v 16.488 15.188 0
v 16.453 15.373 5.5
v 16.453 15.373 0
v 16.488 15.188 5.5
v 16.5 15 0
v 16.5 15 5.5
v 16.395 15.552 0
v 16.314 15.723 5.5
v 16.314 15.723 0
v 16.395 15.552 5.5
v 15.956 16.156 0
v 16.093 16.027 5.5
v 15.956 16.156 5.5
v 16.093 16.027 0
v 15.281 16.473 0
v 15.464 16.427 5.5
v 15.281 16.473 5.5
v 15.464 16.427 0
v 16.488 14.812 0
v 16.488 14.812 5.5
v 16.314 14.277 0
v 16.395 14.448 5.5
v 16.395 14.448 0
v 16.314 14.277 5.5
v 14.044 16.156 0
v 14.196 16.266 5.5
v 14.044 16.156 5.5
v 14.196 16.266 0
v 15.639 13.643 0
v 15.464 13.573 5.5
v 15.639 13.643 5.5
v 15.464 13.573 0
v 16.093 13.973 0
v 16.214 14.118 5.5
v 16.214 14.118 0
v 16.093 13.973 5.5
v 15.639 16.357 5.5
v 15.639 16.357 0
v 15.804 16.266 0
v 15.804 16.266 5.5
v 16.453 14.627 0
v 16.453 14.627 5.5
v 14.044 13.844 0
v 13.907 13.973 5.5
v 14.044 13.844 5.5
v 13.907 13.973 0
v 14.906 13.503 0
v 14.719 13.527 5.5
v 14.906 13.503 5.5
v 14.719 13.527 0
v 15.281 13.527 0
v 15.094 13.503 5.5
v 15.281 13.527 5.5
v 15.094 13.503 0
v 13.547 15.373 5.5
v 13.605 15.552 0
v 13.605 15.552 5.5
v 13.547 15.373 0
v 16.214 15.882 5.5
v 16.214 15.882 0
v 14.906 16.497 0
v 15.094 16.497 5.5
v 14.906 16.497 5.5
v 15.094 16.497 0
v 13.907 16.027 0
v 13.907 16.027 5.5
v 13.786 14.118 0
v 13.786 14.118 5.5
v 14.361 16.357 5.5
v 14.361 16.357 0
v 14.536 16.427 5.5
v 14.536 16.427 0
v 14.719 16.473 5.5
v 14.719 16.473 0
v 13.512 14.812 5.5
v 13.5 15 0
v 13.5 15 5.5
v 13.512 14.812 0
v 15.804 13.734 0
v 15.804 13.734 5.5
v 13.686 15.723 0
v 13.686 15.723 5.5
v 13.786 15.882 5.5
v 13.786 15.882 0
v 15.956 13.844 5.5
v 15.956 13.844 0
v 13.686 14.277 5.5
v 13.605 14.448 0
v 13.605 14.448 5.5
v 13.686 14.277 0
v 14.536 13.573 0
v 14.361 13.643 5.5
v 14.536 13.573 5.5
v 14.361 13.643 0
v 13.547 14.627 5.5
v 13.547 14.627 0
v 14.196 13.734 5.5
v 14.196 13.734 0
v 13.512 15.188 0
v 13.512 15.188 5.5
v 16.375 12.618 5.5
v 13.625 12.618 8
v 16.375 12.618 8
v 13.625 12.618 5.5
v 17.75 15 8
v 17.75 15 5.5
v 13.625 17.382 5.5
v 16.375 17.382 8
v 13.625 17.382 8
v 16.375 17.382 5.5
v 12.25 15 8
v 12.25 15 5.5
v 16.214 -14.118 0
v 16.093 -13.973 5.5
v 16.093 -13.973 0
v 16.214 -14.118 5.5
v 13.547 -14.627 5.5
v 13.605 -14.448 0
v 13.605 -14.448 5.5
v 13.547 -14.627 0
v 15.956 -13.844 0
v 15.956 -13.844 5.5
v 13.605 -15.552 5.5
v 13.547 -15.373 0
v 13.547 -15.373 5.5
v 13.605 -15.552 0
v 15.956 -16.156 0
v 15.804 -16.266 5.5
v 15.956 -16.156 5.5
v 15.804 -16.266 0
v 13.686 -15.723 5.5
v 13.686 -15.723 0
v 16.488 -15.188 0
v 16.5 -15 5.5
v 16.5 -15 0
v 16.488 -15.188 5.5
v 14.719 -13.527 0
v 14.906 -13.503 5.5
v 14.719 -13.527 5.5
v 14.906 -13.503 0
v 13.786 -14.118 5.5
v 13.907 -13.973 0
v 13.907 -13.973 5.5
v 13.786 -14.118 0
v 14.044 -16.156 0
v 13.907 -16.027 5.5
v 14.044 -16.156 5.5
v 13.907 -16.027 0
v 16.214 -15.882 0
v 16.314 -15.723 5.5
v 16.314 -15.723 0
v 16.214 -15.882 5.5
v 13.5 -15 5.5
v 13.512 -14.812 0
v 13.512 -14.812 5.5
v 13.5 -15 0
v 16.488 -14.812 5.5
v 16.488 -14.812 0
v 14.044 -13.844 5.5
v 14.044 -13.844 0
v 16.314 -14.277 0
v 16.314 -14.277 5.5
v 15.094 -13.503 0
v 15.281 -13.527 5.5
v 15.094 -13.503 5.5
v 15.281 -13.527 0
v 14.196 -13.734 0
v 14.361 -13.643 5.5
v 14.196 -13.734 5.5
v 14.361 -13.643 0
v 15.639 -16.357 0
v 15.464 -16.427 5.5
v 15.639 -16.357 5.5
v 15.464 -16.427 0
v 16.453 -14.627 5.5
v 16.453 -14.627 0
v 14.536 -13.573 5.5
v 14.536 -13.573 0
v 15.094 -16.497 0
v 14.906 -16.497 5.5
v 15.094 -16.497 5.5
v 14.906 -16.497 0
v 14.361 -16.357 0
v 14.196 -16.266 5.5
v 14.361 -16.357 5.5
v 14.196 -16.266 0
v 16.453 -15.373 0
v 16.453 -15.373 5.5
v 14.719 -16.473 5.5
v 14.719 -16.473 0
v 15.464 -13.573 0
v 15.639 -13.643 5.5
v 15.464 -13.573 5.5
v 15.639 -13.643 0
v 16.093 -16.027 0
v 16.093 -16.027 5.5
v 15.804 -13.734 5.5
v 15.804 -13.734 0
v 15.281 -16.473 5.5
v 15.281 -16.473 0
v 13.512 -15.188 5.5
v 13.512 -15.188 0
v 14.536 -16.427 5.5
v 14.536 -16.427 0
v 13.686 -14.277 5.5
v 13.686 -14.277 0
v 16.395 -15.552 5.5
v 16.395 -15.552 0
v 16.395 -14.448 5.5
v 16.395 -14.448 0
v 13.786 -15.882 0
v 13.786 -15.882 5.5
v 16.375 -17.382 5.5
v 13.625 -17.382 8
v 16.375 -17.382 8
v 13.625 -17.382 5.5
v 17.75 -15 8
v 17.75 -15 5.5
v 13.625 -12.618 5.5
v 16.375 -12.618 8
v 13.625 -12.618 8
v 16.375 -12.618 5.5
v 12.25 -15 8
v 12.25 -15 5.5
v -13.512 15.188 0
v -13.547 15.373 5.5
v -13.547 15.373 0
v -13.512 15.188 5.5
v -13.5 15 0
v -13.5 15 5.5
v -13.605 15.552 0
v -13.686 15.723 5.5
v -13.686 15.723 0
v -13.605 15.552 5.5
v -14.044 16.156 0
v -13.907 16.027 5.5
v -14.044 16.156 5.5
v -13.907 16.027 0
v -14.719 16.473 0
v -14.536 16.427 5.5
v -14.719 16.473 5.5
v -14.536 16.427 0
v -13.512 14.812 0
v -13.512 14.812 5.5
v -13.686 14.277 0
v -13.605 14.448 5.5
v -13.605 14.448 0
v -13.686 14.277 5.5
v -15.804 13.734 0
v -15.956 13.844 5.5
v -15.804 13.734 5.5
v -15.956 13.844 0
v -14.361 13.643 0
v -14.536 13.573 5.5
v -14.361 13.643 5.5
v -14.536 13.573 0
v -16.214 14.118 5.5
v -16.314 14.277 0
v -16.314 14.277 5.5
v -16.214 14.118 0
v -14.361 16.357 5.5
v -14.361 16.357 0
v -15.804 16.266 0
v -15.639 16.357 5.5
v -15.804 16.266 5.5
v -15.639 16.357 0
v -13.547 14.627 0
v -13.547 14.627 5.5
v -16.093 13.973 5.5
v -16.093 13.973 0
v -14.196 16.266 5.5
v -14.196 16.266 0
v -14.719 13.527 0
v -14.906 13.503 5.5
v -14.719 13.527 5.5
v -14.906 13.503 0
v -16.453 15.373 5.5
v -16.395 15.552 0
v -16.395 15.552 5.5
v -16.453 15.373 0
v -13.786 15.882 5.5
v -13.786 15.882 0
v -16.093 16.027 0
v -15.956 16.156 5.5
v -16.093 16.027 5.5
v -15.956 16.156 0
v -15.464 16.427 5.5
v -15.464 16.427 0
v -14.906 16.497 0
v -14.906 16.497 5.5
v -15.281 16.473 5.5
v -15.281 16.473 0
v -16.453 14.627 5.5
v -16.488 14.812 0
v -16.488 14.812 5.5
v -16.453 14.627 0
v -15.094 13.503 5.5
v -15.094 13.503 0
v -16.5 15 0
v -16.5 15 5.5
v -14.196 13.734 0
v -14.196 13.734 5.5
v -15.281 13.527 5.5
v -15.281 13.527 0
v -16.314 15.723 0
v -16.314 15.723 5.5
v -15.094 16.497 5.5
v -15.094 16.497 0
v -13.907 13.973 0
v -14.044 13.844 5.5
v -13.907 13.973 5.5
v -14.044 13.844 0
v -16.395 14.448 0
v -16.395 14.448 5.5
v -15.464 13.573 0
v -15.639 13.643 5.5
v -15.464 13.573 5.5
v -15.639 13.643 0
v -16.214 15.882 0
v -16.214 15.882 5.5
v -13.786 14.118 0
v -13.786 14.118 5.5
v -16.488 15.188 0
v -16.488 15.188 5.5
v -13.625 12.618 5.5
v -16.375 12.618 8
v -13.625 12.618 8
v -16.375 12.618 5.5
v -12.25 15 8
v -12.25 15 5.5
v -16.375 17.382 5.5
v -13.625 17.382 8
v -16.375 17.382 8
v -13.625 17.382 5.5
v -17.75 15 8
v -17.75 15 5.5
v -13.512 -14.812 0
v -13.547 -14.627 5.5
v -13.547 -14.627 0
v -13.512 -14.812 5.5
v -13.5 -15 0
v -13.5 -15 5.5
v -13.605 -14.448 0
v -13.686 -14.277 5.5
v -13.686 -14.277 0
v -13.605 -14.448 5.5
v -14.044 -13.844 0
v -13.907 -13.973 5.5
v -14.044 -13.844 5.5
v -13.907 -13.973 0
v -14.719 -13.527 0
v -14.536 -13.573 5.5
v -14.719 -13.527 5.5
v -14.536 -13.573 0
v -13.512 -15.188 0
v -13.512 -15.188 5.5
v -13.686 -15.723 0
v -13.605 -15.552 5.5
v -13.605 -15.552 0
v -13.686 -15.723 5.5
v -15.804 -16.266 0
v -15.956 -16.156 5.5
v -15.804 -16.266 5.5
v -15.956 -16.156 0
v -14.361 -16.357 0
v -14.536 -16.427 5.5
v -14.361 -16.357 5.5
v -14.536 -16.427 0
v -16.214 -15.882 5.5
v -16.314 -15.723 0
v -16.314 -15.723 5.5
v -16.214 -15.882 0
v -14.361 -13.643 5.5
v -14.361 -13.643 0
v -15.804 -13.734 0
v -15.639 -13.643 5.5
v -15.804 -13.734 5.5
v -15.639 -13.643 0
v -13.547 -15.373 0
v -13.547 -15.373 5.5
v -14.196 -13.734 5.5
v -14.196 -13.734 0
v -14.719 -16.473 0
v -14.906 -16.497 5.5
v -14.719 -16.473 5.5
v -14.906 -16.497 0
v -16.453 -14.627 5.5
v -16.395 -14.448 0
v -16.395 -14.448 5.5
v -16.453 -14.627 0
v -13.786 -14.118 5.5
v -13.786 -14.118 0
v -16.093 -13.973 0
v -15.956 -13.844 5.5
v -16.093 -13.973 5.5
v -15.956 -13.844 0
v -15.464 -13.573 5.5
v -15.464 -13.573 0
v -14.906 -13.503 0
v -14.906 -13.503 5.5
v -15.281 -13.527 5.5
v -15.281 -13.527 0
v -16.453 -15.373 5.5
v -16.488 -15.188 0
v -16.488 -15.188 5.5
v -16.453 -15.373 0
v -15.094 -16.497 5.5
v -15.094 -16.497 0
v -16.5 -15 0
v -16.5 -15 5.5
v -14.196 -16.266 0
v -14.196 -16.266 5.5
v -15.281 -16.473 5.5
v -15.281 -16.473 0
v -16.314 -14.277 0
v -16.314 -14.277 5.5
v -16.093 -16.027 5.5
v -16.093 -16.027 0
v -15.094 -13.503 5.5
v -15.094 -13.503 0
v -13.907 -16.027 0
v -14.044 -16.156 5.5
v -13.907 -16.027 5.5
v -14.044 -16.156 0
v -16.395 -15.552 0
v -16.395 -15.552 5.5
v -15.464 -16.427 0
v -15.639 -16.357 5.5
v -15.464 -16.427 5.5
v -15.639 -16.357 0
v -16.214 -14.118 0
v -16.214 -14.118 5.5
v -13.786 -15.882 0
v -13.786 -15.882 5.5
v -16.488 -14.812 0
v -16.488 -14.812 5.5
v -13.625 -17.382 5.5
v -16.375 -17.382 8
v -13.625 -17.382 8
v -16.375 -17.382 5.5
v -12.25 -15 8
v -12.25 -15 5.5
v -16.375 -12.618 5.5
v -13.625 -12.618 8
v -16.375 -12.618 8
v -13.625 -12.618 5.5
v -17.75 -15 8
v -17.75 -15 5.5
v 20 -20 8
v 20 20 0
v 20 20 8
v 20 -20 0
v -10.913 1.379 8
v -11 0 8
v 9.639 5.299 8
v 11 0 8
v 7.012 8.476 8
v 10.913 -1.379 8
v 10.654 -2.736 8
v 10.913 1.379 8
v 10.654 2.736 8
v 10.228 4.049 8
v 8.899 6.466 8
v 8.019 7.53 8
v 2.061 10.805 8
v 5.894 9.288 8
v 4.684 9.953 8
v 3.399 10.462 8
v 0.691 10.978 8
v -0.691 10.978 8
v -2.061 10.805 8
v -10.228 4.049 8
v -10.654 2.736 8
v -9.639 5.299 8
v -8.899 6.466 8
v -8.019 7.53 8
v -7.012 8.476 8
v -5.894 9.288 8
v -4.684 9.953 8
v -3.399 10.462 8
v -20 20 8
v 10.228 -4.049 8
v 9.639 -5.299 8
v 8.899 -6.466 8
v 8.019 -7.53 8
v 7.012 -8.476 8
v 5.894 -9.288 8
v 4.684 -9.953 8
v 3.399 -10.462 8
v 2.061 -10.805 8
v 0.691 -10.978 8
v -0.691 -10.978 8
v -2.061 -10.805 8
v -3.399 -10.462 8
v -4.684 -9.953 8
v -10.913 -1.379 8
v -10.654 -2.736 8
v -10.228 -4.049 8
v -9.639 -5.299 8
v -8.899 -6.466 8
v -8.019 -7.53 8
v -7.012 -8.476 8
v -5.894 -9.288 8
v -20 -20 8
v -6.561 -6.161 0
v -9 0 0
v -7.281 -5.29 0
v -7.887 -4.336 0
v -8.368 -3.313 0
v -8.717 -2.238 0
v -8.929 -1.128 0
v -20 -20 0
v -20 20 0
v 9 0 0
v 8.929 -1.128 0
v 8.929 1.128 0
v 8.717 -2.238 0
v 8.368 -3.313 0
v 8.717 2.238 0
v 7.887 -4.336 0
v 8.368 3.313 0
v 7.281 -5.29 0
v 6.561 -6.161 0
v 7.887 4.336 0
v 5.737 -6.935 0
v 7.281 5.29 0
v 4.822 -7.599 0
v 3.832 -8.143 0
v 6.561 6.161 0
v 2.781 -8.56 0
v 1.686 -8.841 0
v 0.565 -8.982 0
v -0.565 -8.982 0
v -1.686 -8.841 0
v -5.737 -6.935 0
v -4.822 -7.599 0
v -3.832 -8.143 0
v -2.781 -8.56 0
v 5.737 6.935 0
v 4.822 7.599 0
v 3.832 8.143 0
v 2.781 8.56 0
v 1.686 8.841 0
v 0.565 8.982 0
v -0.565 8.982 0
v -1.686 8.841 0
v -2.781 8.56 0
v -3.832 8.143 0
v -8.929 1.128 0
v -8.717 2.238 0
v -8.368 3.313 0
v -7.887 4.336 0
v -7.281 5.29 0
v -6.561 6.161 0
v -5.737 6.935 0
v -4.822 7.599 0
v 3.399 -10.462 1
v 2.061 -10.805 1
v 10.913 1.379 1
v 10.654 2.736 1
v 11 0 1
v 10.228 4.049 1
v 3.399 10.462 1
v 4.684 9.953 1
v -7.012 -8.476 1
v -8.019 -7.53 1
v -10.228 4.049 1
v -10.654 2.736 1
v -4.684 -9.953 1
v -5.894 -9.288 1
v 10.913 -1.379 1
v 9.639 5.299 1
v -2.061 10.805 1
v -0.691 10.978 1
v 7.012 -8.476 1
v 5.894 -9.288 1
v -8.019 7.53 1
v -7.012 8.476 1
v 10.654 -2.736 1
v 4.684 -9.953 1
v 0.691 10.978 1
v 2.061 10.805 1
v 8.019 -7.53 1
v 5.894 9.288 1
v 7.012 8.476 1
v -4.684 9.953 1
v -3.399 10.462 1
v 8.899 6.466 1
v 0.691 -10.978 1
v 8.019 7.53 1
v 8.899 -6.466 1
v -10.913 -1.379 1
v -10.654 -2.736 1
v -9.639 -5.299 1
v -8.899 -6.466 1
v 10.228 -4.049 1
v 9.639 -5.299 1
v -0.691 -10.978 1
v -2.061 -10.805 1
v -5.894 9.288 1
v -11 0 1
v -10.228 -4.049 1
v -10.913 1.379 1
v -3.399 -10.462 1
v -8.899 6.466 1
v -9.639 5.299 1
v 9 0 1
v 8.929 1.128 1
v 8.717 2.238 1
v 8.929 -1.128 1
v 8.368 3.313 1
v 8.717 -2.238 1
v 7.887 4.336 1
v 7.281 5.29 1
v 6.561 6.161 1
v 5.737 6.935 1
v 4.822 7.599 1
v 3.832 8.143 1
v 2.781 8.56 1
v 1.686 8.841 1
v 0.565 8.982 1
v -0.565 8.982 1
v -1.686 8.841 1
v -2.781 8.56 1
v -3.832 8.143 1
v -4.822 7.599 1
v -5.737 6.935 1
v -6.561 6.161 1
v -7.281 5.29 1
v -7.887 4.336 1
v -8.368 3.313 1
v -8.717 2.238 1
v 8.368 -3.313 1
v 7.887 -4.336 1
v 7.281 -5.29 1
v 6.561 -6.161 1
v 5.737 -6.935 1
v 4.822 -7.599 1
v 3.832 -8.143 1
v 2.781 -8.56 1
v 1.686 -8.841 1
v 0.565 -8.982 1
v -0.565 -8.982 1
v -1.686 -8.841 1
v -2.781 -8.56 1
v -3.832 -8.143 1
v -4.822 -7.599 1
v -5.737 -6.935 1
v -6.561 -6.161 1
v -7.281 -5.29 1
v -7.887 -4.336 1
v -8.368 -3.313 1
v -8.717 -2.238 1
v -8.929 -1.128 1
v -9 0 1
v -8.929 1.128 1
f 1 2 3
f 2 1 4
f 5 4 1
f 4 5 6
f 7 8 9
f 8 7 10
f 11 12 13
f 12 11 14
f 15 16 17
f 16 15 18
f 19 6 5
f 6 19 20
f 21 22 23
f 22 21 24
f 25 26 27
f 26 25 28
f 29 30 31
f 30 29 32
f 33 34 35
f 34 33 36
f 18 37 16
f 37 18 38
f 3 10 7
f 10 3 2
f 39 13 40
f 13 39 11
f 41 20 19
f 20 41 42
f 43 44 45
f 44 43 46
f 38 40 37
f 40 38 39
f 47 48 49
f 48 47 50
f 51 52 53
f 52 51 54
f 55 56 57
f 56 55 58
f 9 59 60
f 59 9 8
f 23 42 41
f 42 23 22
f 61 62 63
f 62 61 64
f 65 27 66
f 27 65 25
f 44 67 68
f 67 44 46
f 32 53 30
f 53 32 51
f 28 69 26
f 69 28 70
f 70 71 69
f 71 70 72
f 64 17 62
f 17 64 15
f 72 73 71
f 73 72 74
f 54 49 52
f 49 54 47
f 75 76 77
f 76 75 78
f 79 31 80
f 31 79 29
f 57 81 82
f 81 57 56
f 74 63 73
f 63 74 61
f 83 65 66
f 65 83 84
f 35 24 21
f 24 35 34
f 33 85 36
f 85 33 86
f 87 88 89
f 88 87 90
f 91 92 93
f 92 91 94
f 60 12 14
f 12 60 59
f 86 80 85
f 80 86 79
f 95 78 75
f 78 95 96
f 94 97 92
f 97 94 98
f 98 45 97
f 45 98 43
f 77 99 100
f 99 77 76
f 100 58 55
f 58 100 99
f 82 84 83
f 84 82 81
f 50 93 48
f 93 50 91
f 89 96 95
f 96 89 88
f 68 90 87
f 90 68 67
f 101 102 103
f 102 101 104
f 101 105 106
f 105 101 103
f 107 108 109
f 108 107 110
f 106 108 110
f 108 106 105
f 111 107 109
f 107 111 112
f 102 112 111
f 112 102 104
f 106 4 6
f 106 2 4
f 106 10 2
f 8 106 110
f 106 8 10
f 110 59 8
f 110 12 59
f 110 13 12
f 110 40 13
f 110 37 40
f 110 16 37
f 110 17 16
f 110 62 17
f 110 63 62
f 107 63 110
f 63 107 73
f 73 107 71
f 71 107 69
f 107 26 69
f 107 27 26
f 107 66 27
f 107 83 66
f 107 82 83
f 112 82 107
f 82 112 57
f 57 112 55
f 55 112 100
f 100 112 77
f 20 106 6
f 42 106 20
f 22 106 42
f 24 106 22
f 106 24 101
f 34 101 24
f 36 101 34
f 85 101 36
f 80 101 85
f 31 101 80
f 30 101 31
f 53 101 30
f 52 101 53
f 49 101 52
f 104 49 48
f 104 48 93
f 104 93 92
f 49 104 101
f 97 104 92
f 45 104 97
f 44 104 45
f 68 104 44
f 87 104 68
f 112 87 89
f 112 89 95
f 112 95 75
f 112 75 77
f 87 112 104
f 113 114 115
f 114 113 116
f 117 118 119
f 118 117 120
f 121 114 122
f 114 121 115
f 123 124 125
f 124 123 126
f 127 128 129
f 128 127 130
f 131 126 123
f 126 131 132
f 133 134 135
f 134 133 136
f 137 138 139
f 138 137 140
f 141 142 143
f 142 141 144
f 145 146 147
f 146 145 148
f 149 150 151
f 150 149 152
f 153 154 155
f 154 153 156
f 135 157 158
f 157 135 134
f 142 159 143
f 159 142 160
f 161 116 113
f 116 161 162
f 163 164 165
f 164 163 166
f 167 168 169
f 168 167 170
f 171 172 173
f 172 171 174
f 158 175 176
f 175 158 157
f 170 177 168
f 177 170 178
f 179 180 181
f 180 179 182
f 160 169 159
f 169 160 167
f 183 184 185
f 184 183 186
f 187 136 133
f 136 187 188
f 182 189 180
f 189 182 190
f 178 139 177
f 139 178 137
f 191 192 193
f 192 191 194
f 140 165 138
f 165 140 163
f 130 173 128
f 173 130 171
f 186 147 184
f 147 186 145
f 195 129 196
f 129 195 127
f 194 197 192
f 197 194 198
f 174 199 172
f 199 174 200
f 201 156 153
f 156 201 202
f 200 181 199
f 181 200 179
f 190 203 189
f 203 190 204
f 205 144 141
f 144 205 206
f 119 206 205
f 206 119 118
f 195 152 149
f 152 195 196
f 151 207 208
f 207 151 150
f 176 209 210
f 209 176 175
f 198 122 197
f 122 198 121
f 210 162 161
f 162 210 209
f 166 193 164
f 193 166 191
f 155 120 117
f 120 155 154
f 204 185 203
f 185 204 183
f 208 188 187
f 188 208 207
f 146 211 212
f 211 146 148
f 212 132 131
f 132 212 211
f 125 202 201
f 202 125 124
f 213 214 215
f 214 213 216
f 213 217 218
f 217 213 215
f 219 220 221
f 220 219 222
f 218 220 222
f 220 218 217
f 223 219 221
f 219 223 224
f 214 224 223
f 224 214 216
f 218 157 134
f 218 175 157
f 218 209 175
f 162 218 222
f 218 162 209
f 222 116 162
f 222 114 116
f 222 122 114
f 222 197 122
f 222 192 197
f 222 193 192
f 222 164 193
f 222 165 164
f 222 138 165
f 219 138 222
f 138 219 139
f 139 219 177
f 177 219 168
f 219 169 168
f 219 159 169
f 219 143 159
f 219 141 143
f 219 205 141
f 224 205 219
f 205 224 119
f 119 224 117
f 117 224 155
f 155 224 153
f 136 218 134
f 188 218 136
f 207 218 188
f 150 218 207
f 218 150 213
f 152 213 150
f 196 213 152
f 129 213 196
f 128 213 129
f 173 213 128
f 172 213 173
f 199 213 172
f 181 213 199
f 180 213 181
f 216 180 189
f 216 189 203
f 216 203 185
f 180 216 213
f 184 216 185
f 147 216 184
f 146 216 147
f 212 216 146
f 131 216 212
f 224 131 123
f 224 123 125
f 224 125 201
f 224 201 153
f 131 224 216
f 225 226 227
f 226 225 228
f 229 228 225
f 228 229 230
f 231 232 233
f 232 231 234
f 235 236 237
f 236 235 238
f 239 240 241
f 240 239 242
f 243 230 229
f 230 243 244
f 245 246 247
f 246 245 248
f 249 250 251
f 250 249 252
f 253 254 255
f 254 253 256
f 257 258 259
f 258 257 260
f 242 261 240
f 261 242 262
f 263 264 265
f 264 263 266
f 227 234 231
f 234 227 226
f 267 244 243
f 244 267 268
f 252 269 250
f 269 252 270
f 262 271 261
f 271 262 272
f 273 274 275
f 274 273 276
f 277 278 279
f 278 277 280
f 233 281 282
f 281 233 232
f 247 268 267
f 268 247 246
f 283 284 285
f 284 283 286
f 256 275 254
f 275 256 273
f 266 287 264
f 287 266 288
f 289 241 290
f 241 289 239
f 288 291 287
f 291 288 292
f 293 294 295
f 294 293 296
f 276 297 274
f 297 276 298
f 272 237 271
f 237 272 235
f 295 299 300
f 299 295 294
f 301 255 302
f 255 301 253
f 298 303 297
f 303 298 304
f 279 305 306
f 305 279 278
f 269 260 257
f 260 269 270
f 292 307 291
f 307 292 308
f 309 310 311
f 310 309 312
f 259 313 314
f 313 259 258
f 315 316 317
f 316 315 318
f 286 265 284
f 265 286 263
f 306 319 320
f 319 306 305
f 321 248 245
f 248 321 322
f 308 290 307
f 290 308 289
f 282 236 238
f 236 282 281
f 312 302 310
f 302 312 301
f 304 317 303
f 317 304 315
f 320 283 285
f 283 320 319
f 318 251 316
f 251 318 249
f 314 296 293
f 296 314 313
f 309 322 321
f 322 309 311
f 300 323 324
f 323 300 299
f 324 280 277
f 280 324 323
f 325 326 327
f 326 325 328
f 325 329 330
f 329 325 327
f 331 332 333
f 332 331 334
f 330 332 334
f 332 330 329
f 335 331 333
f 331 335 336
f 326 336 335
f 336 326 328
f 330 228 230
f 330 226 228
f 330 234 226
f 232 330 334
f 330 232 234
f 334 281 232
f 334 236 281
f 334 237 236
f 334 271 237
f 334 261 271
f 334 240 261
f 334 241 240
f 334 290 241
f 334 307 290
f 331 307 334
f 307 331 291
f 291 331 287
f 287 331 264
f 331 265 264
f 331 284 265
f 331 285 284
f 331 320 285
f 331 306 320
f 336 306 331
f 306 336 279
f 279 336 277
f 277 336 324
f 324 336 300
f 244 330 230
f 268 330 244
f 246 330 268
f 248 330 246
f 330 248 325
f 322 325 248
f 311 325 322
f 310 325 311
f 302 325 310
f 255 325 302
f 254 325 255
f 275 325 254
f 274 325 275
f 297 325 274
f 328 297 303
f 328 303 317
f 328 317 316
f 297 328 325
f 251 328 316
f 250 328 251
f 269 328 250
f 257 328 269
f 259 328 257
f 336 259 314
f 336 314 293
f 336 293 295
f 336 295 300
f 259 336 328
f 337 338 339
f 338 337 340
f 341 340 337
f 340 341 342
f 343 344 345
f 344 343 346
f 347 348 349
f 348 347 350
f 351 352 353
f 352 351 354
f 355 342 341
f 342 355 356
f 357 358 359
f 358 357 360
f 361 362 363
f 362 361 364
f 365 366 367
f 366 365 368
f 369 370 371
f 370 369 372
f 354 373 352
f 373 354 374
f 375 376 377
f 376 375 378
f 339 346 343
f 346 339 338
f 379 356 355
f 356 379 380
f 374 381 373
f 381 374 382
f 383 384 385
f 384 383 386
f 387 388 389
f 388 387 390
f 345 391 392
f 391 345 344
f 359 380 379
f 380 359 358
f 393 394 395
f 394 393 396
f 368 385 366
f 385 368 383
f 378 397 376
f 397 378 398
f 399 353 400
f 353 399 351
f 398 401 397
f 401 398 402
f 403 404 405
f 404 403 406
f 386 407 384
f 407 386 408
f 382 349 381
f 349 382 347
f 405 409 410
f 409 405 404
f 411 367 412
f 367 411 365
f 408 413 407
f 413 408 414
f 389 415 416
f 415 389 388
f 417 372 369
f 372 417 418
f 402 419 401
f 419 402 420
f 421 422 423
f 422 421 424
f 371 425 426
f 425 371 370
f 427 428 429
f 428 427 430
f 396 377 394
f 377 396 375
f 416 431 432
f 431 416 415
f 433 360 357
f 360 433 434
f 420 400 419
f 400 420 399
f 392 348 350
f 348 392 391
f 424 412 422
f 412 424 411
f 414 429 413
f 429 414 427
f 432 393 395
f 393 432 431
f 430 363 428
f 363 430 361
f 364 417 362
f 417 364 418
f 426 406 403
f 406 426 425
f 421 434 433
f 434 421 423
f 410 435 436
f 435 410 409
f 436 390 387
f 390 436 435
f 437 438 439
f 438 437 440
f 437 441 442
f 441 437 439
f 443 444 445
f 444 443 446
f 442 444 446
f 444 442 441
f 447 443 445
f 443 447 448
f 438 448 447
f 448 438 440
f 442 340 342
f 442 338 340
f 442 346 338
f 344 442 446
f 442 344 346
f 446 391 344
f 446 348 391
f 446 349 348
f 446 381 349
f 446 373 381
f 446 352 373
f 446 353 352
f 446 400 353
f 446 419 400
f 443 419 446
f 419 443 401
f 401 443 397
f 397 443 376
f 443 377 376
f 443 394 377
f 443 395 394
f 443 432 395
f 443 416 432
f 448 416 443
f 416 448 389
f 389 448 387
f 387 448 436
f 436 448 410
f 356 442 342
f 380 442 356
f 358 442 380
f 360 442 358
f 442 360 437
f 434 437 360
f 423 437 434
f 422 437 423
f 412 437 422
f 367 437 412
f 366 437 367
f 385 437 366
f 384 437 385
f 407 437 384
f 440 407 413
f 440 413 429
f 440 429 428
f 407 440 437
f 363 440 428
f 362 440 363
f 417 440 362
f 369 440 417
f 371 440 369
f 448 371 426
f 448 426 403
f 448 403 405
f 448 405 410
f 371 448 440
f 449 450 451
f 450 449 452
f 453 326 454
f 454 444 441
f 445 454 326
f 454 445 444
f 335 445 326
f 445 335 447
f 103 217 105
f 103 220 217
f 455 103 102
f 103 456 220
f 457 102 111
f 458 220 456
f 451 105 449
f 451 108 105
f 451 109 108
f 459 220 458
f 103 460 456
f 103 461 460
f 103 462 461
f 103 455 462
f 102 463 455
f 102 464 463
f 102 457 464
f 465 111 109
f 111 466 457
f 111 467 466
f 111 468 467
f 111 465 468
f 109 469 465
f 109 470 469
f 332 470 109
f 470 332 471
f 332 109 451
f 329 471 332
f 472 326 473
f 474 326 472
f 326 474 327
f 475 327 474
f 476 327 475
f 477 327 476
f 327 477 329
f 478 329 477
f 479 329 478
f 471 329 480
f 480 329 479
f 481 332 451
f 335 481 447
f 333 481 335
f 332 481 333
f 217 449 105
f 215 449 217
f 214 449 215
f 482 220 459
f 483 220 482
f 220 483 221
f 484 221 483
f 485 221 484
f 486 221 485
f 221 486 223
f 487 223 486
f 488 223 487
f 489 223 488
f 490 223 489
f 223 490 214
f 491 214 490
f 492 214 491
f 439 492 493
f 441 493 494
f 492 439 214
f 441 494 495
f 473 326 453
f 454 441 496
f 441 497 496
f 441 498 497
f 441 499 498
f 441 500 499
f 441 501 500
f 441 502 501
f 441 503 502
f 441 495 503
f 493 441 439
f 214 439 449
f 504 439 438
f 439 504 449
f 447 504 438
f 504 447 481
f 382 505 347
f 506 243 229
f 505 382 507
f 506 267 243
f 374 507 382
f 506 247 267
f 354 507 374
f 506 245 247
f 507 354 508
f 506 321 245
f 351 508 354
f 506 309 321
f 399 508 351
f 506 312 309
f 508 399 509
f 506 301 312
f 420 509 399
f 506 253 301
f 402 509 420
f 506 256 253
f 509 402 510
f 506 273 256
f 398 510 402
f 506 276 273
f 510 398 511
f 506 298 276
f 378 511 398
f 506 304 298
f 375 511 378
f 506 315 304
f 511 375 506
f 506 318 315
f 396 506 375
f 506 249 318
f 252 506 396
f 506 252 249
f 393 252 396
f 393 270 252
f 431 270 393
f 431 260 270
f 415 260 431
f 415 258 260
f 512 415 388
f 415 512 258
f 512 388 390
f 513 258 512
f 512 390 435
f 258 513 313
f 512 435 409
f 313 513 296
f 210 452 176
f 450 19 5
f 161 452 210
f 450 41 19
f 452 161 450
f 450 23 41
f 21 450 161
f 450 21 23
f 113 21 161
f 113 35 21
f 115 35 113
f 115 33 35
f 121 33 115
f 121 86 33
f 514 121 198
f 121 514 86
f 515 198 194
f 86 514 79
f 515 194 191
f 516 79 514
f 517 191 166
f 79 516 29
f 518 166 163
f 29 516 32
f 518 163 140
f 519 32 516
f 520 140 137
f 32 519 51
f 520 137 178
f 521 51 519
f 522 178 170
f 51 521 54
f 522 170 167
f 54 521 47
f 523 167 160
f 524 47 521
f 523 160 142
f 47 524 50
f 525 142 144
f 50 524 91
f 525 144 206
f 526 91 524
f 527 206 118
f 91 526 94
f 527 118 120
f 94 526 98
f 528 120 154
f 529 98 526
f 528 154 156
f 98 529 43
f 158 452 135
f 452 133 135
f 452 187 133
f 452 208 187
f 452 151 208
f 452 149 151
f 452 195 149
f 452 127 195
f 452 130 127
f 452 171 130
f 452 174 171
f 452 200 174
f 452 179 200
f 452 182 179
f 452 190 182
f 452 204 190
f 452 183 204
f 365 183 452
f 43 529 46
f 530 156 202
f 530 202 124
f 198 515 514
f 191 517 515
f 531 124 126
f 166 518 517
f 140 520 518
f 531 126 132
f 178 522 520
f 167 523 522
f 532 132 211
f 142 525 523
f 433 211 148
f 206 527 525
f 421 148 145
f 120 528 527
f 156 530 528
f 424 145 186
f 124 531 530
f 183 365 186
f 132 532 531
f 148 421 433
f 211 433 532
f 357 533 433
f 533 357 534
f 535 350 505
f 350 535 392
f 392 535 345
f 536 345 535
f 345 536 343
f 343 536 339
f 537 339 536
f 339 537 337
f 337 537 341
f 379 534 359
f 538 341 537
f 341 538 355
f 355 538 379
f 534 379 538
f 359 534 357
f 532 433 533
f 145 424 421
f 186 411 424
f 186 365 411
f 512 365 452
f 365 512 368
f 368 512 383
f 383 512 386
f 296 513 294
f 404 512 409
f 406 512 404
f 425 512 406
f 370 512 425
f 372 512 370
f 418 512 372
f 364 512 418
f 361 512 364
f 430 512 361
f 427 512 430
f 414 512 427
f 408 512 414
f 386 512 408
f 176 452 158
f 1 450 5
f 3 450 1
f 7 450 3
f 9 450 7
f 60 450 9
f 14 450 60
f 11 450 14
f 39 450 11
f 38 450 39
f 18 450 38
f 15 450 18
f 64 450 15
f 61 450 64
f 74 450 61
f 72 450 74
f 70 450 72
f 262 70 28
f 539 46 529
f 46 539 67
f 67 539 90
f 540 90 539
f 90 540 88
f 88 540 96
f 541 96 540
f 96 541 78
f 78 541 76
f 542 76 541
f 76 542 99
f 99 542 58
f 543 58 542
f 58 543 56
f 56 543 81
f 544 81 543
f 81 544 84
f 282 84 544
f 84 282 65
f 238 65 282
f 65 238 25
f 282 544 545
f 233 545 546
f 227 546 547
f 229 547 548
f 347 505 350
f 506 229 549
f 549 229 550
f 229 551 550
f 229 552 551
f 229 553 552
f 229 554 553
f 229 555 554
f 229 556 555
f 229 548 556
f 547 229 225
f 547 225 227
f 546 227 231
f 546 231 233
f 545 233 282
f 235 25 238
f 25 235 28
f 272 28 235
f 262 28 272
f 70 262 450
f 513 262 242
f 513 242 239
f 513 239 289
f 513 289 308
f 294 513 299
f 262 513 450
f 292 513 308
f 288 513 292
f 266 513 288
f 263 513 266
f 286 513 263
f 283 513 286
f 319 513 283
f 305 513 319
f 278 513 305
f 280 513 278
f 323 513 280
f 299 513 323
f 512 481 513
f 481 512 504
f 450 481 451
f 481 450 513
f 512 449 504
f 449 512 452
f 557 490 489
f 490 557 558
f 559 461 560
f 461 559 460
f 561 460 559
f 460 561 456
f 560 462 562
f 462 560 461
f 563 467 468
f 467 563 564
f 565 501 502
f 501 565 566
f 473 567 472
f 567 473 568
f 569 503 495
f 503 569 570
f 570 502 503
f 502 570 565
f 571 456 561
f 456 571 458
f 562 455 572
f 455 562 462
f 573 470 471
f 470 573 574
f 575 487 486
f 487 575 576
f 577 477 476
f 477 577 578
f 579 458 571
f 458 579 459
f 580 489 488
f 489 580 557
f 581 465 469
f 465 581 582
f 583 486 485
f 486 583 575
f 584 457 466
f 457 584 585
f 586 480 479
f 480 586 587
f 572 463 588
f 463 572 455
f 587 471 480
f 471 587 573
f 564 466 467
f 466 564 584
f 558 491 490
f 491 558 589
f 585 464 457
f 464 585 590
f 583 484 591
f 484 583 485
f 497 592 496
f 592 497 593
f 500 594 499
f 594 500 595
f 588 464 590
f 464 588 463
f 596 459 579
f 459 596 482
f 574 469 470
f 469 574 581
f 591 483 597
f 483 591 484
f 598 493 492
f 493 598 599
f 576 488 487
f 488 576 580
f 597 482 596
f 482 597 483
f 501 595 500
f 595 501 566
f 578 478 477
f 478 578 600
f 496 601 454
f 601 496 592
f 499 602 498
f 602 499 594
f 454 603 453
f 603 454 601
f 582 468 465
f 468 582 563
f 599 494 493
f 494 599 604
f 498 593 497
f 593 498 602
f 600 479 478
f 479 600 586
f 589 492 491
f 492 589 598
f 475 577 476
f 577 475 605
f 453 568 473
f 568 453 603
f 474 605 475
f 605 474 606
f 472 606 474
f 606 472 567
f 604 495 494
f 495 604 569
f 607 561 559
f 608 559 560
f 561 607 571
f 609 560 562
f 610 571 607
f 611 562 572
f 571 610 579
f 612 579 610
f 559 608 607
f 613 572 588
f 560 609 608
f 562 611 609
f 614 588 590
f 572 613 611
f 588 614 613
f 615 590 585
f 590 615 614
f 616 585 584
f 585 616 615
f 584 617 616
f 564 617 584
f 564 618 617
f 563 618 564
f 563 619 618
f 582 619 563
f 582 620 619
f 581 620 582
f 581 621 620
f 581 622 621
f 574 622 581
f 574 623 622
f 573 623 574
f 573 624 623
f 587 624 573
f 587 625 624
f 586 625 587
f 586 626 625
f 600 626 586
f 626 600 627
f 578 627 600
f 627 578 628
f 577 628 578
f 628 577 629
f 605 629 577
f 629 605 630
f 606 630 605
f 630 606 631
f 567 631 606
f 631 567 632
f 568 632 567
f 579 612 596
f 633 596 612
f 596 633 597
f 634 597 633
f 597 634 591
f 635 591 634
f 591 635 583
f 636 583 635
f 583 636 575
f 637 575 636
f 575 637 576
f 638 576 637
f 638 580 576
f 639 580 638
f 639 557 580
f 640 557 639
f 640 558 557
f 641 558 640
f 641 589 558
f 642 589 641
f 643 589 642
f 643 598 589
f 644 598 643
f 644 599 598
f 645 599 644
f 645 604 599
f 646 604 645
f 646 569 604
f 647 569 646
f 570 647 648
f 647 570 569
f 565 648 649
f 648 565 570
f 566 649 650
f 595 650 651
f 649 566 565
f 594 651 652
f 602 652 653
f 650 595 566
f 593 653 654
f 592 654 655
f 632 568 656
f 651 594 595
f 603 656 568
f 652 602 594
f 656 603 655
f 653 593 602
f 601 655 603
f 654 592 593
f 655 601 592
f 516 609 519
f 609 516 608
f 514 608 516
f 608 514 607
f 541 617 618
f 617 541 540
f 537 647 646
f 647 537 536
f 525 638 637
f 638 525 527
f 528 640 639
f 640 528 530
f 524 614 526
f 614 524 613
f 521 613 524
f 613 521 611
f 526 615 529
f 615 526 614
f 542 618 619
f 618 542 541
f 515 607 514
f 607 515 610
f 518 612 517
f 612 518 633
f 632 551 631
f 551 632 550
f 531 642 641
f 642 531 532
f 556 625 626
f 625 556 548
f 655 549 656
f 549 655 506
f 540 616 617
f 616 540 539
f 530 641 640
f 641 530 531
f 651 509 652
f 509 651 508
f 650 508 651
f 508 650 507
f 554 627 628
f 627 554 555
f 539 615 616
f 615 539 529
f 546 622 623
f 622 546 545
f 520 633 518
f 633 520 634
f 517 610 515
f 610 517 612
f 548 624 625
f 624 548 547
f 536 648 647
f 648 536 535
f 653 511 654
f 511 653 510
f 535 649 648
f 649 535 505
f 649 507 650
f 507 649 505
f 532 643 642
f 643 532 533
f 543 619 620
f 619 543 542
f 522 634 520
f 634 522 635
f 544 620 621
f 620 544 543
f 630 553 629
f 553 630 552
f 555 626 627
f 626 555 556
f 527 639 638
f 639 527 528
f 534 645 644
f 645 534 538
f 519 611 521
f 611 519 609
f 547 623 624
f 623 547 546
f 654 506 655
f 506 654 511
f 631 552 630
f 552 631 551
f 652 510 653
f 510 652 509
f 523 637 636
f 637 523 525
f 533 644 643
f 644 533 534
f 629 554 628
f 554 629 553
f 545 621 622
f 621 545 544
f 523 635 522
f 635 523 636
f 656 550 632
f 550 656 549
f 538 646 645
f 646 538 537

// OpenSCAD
height = 8;
width = 40;
bearing_outer_diameter = 22;
bearing_height = 7; 
flange_inner_diameter = 18;
bolt_center_distance_from_edge = 5;
bolt_diameter = 3;
nut_diameter = 5.5;
nut_height = 2.5;
translate([0,0,height/2]){
    union(){
        difference(){
            cube([width, width, height], center = true);
            cylinder(r = bearing_outer_diameter/2, h = height*1.1, center = true, $fn=50);
            translate([width/2-bolt_center_distance_from_edge, width/2-bolt_center_distance_from_edge, 0]){
                cylinder(r = bolt_diameter/2, h = height*1.1, center = true, $fn=50);
                translate([0,0,height-nut_height]){
                      cylinder(r = nut_diameter/2, h = height, center = true, $fn=6);  
                }
            }
            translate([width/2-bolt_center_distance_from_edge, -width/2+bolt_center_distance_from_edge, 0]){
                cylinder(r = bolt_diameter/2, h = height*1.1, center = true, $fn=50);
                translate([0,0,height-nut_height]){
                      cylinder(r = nut_diameter/2, h = height, center = true, $fn=6);  
                }
            }
            translate([-width/2+bolt_center_distance_from_edge, width/2-bolt_center_distance_from_edge, 0]){
                cylinder(r = bolt_diameter/2, h = height*1.1, center = true, $fn=50);
                translate([0,0,height-nut_height]){
                      cylinder(r = nut_diameter/2, h = height, center = true, $fn=6);  
                }
            }
            translate([-width/2+bolt_center_distance_from_edge, -width/2+bolt_center_distance_from_edge, 0]){
                cylinder(r = bolt_diameter/2, h = height*1.1, center = true, $fn=50);
                translate([0,0,height-nut_height]){
                      cylinder(r = nut_diameter/2, h = height, center = true, $fn=6);  
                }
            }
            
        }
        translate([0,0,-(height/2-(height-bearing_height)/2)]){
            difference(){
                cylinder(r = bearing_outer_diameter/2, h = height-bearing_height, center = true, $fn=50);
                cylinder(r = flange_inner_diameter/2, h = (height-bearing_height)*1.1, center = true, $fn=50);
            }
        }
    }
}
